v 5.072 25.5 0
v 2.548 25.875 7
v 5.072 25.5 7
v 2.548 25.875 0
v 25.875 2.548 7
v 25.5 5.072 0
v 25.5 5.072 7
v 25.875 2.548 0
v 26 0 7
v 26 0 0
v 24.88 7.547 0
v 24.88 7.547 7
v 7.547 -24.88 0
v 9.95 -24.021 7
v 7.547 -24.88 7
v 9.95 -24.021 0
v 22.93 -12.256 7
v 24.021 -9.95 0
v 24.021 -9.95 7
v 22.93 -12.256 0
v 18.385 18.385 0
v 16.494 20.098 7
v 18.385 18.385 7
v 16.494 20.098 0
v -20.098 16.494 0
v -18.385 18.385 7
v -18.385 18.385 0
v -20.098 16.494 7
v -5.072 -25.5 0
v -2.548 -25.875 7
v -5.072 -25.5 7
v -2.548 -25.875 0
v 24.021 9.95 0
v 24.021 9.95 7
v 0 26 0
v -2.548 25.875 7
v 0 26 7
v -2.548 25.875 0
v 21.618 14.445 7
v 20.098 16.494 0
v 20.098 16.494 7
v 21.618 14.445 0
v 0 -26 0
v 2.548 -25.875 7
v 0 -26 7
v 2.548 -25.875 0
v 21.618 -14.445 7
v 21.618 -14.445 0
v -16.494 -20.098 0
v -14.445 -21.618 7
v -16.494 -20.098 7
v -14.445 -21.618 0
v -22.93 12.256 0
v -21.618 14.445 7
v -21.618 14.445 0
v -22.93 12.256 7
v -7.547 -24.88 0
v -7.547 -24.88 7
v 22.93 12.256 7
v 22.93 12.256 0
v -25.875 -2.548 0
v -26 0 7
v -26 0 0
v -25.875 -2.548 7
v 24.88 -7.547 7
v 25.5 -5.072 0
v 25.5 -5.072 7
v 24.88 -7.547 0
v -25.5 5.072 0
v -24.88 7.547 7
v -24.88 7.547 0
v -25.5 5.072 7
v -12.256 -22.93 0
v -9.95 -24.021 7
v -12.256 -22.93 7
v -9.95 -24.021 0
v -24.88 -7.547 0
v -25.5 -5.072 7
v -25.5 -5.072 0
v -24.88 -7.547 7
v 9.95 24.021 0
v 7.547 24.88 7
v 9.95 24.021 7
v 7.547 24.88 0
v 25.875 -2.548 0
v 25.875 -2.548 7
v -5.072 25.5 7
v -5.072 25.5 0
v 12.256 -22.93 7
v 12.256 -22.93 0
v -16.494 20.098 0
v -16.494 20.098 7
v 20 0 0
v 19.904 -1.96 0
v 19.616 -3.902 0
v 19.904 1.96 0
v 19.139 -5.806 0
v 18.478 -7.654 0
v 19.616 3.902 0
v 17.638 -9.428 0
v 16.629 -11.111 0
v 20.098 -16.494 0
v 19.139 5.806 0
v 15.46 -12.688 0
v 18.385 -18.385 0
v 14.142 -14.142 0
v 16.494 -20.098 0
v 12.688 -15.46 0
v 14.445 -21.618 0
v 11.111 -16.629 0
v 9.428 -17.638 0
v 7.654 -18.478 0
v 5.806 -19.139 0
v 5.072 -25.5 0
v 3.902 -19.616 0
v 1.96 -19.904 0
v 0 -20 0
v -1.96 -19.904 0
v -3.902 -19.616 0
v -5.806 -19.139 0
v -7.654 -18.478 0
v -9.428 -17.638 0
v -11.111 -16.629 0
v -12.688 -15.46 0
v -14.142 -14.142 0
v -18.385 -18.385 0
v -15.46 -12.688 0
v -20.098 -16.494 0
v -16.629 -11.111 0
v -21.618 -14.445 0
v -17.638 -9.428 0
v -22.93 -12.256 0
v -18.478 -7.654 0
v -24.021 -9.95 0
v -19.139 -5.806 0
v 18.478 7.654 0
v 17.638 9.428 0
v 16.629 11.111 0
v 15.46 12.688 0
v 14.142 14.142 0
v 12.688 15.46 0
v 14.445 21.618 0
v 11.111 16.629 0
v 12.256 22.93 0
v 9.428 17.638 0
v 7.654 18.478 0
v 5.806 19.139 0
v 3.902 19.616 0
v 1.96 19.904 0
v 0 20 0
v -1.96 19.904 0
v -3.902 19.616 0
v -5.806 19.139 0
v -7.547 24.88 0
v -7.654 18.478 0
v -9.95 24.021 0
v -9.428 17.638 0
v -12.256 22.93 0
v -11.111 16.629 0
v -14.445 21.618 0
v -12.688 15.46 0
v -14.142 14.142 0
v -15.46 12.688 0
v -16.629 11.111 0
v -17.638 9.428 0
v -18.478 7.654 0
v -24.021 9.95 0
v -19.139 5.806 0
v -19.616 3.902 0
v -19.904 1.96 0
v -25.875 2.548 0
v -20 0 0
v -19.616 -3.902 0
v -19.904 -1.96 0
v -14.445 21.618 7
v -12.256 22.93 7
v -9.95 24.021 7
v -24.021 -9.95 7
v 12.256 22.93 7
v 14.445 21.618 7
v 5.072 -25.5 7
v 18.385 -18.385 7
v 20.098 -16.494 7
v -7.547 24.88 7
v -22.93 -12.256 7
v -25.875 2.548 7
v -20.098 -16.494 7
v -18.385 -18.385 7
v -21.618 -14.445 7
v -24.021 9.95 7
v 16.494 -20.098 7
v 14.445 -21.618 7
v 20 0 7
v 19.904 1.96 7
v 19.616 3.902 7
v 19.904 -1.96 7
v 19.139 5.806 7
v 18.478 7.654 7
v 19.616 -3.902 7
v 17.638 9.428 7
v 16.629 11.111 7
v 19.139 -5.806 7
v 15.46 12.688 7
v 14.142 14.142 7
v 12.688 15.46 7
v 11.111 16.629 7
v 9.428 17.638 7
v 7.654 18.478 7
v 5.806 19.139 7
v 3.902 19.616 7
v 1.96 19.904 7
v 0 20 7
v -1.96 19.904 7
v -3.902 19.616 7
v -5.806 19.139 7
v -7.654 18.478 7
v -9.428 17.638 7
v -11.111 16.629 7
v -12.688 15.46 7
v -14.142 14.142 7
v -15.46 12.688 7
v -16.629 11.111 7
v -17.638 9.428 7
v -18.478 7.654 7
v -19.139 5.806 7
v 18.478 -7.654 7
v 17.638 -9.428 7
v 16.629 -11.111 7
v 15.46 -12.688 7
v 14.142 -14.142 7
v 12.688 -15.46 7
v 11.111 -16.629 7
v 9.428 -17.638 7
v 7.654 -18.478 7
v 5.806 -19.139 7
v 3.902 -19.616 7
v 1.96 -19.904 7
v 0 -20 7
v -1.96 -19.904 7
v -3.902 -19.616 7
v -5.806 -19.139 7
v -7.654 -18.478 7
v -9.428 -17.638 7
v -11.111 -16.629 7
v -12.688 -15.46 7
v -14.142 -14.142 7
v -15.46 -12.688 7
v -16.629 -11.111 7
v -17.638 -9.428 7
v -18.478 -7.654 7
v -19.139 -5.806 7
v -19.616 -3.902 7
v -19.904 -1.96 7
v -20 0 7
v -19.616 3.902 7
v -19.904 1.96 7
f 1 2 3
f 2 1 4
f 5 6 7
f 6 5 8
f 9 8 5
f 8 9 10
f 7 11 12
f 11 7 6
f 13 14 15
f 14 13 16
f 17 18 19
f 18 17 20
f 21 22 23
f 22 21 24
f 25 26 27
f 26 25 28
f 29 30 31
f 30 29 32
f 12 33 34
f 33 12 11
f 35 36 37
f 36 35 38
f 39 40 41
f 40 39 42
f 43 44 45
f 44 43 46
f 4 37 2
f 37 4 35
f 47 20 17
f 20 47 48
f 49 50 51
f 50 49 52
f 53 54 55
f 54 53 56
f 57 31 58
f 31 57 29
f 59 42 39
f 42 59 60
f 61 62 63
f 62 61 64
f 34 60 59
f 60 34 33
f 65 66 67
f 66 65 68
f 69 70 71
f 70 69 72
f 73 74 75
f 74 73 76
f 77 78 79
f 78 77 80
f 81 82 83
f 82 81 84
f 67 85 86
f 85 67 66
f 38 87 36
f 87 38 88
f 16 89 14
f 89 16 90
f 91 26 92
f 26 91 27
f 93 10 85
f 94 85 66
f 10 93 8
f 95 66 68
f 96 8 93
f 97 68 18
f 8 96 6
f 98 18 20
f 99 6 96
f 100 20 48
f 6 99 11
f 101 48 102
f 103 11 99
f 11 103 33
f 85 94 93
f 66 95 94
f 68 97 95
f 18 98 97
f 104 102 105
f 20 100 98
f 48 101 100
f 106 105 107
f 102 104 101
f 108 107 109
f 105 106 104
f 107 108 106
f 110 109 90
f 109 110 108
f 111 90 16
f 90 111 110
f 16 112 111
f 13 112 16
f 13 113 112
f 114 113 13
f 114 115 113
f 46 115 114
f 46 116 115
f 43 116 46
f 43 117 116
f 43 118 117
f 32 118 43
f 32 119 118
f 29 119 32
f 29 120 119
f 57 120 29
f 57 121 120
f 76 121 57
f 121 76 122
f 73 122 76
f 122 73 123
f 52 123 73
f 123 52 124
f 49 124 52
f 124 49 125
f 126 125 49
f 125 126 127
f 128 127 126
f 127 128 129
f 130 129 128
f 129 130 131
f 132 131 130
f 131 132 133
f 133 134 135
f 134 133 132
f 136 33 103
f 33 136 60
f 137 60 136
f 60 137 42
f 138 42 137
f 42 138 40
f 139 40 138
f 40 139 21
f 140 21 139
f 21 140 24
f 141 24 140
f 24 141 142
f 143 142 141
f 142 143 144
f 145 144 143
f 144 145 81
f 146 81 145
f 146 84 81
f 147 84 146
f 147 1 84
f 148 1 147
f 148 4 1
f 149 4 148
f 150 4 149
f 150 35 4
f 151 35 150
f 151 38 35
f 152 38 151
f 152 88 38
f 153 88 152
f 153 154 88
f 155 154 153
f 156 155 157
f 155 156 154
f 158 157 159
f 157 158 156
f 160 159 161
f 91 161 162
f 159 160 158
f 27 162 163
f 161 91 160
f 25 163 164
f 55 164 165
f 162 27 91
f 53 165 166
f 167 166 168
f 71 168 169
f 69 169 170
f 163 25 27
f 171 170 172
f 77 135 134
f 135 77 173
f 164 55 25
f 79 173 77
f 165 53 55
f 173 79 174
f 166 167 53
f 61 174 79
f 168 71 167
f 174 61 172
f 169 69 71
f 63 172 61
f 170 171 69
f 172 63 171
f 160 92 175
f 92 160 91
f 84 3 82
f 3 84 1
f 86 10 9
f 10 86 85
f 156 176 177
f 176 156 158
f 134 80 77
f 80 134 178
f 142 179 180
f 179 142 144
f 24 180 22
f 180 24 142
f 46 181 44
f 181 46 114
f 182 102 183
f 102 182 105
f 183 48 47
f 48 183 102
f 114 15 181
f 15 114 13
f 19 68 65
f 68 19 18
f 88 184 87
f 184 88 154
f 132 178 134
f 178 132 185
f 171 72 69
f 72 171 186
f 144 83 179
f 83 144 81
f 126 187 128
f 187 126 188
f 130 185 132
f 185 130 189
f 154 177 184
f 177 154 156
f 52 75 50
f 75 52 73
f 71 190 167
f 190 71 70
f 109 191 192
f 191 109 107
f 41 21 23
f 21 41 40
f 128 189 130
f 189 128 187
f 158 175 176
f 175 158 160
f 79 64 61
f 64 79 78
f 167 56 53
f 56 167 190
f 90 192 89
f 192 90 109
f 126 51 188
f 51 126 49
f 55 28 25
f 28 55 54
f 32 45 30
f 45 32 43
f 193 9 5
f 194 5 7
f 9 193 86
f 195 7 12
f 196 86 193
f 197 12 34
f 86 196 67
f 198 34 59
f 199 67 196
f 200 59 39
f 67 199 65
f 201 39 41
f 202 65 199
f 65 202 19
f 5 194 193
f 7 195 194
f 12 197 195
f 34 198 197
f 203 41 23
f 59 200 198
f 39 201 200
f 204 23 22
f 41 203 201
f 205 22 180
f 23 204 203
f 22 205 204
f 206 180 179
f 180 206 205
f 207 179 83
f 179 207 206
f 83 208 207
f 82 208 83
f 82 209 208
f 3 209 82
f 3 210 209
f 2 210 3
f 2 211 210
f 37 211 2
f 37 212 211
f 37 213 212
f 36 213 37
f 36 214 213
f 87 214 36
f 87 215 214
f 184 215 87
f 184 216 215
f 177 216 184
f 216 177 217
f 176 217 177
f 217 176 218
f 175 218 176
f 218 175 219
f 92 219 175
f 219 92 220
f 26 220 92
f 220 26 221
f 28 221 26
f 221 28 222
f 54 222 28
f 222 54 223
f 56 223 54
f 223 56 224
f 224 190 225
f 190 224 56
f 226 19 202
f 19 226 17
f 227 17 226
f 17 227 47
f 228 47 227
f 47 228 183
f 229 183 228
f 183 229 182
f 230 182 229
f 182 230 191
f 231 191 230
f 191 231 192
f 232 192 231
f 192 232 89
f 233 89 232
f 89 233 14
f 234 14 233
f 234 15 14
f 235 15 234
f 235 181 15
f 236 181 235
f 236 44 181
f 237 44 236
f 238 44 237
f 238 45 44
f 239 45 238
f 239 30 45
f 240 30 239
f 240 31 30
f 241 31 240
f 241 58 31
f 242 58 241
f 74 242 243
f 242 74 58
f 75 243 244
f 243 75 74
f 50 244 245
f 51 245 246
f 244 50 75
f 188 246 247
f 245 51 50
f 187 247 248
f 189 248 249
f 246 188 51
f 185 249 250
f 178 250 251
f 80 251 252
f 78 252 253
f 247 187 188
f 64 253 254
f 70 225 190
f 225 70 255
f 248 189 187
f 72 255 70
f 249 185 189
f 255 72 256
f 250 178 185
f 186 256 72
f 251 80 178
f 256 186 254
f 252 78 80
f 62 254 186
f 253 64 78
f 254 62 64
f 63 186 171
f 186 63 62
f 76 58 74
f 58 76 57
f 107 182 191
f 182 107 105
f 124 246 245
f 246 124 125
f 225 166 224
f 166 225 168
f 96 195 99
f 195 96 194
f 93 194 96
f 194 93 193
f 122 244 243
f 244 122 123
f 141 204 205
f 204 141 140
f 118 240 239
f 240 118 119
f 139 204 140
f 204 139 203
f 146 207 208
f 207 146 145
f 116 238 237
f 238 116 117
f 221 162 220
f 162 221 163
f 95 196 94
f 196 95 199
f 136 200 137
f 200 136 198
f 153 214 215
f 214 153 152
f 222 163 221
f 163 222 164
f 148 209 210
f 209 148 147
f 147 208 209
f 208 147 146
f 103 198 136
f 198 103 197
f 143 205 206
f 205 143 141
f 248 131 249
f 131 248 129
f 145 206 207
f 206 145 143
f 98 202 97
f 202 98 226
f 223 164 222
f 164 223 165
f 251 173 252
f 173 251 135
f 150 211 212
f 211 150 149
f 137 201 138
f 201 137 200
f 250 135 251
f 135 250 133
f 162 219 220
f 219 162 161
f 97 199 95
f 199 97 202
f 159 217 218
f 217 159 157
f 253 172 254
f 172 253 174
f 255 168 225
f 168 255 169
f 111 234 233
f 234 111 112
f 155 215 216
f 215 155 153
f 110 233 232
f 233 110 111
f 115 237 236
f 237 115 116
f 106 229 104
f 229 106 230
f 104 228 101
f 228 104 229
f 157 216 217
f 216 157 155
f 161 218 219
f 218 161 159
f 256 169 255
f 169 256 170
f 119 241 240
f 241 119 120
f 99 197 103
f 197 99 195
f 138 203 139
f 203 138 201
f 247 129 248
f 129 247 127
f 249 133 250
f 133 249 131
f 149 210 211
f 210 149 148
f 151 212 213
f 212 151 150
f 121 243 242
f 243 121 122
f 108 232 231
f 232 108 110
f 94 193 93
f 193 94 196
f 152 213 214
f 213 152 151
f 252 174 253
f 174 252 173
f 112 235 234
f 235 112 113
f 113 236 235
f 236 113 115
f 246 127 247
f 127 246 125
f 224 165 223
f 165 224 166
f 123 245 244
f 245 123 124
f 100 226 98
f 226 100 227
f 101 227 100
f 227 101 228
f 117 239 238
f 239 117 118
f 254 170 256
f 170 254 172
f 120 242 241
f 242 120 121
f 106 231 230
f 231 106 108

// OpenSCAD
module ball_bearing() {
    difference() {
        // Outer ring
        cylinder(h=7.0, d=52.0, $fn=64);
        
        // Inner bore
        translate([0, 0, -1])
            cylinder(h=9.0, d=40.0, $fn=64);
    }
}

ball_bearing();
